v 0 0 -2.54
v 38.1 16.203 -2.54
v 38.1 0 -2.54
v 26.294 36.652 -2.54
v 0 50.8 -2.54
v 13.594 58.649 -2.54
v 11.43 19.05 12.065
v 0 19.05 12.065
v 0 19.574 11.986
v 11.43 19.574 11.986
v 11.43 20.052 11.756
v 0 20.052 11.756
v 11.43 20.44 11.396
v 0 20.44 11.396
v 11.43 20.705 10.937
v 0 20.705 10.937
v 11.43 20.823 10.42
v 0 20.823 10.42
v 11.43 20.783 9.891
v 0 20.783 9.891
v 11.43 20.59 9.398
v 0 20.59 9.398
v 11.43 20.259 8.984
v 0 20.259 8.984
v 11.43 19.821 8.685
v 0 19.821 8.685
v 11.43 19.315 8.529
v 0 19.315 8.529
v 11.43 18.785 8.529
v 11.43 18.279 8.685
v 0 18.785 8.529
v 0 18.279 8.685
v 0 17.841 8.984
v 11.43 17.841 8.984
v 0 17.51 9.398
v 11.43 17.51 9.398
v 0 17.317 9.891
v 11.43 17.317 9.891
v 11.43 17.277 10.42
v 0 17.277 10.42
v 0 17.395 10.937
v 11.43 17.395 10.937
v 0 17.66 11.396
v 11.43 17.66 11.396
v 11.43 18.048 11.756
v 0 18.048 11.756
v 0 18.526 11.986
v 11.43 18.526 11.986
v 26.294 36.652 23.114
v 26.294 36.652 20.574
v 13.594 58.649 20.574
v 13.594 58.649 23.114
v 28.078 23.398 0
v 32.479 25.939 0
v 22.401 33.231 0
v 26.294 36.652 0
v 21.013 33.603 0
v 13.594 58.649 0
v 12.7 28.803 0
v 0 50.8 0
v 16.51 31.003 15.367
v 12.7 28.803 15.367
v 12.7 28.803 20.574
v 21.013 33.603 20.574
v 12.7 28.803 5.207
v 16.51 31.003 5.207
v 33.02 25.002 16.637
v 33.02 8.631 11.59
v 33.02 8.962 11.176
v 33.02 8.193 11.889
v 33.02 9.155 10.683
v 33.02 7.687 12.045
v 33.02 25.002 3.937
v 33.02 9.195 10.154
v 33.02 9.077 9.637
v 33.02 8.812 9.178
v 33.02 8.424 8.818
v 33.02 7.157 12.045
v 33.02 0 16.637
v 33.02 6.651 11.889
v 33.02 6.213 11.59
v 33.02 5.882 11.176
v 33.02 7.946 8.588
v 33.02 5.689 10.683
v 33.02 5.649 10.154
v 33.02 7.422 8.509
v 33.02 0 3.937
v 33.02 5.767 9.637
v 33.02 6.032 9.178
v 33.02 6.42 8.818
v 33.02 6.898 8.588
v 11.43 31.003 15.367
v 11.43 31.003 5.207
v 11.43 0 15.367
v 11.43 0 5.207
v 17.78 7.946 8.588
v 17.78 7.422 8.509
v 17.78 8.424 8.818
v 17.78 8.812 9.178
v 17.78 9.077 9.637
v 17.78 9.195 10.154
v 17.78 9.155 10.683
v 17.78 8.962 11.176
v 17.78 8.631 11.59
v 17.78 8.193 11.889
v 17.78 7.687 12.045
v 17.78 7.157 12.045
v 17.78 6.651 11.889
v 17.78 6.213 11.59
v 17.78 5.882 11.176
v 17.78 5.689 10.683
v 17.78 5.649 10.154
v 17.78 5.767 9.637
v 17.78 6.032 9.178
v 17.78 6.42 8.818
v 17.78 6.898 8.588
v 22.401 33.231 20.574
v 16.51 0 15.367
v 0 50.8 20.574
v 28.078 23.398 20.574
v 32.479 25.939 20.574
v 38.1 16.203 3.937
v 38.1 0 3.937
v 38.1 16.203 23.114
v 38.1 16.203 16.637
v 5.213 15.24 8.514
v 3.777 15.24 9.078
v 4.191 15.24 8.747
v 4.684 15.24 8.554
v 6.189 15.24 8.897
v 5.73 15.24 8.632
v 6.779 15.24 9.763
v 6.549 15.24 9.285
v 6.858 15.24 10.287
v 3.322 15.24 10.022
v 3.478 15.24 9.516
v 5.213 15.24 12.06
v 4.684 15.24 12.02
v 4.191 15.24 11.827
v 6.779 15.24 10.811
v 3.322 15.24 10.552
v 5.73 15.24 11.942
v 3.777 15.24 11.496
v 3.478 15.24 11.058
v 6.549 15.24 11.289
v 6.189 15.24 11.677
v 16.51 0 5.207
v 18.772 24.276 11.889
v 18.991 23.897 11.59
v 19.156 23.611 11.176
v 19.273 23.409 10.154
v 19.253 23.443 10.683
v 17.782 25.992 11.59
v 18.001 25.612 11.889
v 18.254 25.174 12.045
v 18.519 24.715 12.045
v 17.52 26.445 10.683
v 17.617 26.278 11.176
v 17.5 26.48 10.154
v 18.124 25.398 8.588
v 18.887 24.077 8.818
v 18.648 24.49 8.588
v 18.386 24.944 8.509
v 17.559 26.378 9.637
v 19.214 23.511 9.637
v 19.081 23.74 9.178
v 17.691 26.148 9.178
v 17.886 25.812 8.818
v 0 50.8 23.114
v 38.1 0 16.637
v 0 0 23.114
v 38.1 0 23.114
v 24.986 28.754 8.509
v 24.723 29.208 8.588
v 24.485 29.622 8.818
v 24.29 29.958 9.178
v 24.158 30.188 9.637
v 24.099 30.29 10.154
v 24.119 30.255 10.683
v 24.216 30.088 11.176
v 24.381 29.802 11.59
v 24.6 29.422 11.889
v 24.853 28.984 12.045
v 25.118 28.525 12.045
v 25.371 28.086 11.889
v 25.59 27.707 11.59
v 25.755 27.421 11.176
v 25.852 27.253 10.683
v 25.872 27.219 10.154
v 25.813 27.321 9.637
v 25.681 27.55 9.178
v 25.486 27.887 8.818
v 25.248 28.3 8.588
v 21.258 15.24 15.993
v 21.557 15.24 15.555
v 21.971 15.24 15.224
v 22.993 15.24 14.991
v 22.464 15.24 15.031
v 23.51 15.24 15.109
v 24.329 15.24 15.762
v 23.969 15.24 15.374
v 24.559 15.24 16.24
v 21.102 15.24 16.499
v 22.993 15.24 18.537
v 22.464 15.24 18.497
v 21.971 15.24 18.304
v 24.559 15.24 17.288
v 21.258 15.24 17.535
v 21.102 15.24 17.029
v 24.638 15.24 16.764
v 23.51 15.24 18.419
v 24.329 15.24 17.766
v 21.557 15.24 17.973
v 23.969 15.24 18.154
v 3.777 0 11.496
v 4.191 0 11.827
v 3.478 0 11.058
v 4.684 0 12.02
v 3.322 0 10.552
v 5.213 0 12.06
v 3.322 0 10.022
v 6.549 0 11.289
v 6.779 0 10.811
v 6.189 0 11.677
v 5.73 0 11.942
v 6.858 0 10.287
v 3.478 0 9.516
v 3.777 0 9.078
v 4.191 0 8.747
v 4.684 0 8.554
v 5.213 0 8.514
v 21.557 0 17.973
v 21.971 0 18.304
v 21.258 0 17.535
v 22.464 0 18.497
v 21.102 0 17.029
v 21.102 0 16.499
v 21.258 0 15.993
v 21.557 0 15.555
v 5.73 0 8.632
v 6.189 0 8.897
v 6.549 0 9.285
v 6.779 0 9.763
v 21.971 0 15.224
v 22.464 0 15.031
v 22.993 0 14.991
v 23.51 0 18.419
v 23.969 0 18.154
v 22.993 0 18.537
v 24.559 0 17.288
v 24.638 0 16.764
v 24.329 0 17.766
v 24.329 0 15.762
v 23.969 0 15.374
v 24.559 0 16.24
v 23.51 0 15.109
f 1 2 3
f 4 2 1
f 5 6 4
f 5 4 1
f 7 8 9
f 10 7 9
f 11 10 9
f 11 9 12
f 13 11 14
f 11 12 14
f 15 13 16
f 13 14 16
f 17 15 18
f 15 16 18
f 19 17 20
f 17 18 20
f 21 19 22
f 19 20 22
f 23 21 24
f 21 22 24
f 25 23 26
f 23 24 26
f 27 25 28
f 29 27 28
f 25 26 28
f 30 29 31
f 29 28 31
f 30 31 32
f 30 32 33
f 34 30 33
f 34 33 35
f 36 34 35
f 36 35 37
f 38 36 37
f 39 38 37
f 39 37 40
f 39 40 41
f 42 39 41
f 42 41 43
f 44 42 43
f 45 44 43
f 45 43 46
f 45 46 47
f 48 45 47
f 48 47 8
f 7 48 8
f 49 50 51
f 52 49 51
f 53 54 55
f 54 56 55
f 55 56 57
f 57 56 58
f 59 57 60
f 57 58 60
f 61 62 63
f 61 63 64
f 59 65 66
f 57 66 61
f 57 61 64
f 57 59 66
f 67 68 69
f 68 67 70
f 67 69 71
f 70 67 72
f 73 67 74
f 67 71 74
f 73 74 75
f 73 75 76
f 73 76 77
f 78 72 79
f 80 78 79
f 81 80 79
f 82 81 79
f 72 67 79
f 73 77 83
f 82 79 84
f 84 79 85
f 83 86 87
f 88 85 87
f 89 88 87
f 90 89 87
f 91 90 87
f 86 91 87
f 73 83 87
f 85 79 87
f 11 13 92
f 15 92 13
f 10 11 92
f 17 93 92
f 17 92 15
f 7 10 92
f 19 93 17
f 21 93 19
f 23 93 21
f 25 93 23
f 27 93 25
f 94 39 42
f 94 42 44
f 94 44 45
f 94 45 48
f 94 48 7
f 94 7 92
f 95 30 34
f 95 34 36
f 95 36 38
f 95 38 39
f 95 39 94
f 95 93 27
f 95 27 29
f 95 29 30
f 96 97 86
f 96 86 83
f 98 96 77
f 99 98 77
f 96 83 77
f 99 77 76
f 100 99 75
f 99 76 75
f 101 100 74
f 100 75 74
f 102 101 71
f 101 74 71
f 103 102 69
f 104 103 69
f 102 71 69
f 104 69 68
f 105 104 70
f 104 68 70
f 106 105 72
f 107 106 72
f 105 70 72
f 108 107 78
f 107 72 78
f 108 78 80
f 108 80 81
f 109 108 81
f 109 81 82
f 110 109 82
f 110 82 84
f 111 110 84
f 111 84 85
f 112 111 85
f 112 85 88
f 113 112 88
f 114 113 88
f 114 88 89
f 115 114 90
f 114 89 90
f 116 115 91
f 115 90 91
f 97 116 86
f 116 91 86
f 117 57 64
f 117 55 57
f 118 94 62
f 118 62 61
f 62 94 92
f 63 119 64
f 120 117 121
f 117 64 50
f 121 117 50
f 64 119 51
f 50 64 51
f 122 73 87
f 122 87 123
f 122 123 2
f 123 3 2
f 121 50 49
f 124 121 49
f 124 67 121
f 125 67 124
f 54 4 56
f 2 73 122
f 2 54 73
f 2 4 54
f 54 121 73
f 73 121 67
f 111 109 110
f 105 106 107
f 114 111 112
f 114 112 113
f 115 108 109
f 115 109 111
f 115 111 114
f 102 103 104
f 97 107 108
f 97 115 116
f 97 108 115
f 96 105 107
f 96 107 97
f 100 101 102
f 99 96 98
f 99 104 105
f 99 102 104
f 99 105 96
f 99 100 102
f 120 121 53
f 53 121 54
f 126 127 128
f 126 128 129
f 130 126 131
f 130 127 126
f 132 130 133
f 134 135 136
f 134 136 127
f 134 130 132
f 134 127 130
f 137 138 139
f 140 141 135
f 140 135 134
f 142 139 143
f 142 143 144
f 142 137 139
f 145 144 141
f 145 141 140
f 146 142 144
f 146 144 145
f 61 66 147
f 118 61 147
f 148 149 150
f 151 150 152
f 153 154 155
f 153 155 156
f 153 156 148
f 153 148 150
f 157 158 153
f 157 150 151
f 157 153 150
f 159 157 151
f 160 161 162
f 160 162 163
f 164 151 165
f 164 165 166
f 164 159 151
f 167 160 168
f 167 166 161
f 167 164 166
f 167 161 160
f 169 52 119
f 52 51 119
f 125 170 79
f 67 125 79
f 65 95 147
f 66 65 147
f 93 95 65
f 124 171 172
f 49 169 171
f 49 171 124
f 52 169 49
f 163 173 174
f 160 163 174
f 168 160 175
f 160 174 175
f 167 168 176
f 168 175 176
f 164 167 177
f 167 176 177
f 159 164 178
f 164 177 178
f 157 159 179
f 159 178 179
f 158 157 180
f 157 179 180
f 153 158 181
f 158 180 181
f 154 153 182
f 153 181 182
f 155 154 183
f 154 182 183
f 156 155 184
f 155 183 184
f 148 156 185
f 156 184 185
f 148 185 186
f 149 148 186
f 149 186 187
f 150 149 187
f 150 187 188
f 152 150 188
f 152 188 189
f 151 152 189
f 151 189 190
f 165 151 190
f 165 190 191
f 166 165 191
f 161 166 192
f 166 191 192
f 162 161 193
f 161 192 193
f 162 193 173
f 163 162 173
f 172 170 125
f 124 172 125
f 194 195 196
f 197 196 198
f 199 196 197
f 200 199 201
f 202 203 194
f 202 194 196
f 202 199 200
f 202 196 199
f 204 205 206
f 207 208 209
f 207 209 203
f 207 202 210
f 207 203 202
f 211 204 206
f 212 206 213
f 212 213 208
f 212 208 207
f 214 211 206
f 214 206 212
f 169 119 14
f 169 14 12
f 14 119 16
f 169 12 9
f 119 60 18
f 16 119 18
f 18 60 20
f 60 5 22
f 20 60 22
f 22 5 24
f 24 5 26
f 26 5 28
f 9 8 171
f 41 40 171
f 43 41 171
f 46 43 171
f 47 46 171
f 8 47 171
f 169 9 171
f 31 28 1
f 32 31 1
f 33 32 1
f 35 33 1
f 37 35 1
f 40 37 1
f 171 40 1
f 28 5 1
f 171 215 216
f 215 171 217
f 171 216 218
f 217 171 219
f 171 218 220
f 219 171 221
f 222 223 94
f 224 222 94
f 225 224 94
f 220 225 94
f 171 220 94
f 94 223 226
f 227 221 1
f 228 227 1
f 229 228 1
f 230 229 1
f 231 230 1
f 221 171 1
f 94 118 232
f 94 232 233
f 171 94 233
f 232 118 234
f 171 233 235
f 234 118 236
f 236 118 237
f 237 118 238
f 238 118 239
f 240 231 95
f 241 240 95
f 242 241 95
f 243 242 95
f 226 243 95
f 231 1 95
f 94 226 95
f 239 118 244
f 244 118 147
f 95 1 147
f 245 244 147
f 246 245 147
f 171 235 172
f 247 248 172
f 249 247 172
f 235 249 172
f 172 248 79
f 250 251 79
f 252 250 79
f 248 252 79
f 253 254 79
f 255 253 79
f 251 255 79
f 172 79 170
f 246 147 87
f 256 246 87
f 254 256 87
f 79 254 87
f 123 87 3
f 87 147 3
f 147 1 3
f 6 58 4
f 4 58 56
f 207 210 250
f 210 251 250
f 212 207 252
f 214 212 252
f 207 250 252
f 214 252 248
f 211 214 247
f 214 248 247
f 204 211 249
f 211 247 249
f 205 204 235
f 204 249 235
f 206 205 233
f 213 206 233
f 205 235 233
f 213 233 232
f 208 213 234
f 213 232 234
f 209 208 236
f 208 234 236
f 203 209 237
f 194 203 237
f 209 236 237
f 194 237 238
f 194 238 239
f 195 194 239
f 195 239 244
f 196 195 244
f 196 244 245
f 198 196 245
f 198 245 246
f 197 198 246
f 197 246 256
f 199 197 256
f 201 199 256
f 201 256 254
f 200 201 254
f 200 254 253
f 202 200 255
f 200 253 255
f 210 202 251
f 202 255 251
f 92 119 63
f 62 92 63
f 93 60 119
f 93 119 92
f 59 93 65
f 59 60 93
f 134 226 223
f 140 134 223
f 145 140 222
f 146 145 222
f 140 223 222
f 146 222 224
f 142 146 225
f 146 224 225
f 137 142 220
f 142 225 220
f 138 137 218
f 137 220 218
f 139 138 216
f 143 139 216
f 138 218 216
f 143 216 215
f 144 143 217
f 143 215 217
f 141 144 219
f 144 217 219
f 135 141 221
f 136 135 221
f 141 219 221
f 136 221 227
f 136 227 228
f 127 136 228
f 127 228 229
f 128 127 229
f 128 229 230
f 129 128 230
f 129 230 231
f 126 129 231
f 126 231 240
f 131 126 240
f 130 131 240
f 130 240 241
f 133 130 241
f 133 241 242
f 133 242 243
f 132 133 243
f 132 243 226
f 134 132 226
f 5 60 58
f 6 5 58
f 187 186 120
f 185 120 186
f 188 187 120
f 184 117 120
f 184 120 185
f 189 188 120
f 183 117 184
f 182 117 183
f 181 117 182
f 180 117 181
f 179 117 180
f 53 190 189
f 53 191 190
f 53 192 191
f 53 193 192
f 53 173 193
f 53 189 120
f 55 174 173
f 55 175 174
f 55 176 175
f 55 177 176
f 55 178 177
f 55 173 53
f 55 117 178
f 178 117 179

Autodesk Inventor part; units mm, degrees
ref_plane "YZ Plane" through (0, 0, 0) normal (1, 0, 0) x (0, 1, 0)
ref_plane "XZ Plane" through (0, 0, 0) normal (0, 1, 0) x (-1, 0, 0)
sketch "Sketch1" plane through (0, 0, 0) normal (0, 0, 1) x (1, 0, 0)
  line L0 (0, 0) -> (38.1, 0)
  line L1 (38.1, 0) -> (38.1, 16.2033)
  line L2 (0, 50.8) -> (0, 0)
  line L3 (0, 50.8) -> (13.5942, 58.6486)
  line L4 (0, 50.8) -> (12.7, 28.803)
  line L5 (12.7, 28.803) -> (26.2942, 36.6516)
  line L6 (26.2942, 36.6516) -> (13.5942, 58.6486)
  line L7 (26.2942, 36.6516) -> (38.1, 16.2033)
  dimension "d0" = 15.6972
  dimension "d1" = 25.4
  dimension "d2" = 38.1
  dimension "d3" = 50.8
  dimension "d4" = 120
extrude "Extrusion1" add sketch "Sketch1" along normal blind 20.574 contours L2 L4 L5 L7 L1 L0
sketch "Sketch2" plane through (0, 0, 20.574) normal (0, 0, 1) x (1, 0, 0)
  line L0 (0, 50.8) -> (0, 0) projected
  line L1 (0, 0) -> (38.1, 0) projected
  line L2 (38.1, 0) -> (38.1, 16.2033) projected
  line L3 (38.1, 16.2033) -> (26.2942, 36.6516) projected
  line L4 (26.2942, 36.6516) -> (12.7, 28.803) projected
  line L5 (12.7, 28.803) -> (0, 50.8) projected
  line L6 (26.2942, 36.6516) -> (13.5942, 58.6486)
  line L7 (13.5942, 58.6486) -> (0, 50.8)
  line L8 (38.1, 16.2033) -> (26.2942, 36.6516) projected
extrude "Extrusion2" add sketch "Sketch2" along normal blind 2.54
ref_plane "Work Plane1" through (0, 0, 10.287) normal (0, 0, -1) x (-1, 0, 0)
mirror "Mirror1" about plane through (0, 0, 10.287) normal (0, 0, -1) of "Extrusion2"
sketch "Sketch3" plane through (0, 0, 23.114) normal (0, -1, 0) x (1, 0, 0)
  line L0 (38.1, -25.654) -> (38.1, 0) projected
  line L1 (38.1, -6.477) -> (33.02, -6.477)
  line L2 (33.02, -6.477) -> (33.02, -19.177)
  line L3 (33.02, -19.177) -> (38.1, -19.177)
  line L4 (38.1, -19.177) -> (38.1, -6.477)
  point P0 (0, -23.114)
  point P1 (38.1, -12.827)
  point P2 (38.1, -19.177)
  dimension "d9" = 12.7
  dimension "d10" = 5.08
  dimension "d11" = 6.35
extrude "Extrusion3" cut sketch "Sketch3" against normal blind 33.9725
sketch "Sketch4" plane through (33.02, 0, 16.637) normal (1, 0, 0) x (0, 0, -1)
  circle A0 centre (6.35, 7.422) radius 1.778 projected
  point P0 (16.637, 0)
extrude "Extrusion4" cut sketch "Sketch4" against normal blind 15.24
ref_plane "Work Plane2" through (0, 0, 10.287) normal (0, 0, 1) x (1, 0, 0)
sketch "Sketch5" plane through (0, 0, 10.287) normal (0, 0, 1) x (1, 0, 0)
  line L0 (26.2942, 36.6516) -> (12.7, 28.803) projected
  line L1 (16.51, 31.0027) -> (11.43, 31.0027)
  line L2 (12.7, 28.803) -> (0, 50.8) projected
  line L3 (16.51, 31.0027) -> (16.51, 0)
  line L4 (0, 0) -> (38.1, 0) projected
  line L5 (11.43, 31.0027) -> (11.43, 0)
  line L6 (16.51, 0) -> (11.43, 0)
  dimension "d16" = 5.08
extrude "Extrusion5" cut sketch "Sketch5" along normal mid plane 10.16 contours L3 L4 L5 L2 L0
sketch "Sketch6" plane through (13.5942, 58.6486, 23.114) normal (0.8660254, 0.5, 0) x (0, 0, -1)
  line L0 (23.114, -25.4) -> (2.54, -25.4)
  line L1 (2.54, -25.4) -> (2.54, -37.7698)
  line L2 (2.54, -37.7698) -> (23.114, -37.7698)
  line L3 (23.114, -37.7698) -> (23.114, -25.4)
  point P0 (23.114, -43.9941)
  dimension "d19" = 12.3698
extrude "Extrusion6" cut sketch "Sketch6" against normal blind 5.08
chamfer "Chamfer1" distance 1.016 angle 45 1 edges at (21.893, 34.1106, 10.287)
sketch "Sketch7" plane through (9.1948, 56.1086, 23.114) normal (0.8660254, 0.5, 0) x (0, 0, -1)
  circle A0 centre (12.827, -31.5849) radius 1.778
  line L0 (2.54, -25.4) -> (2.54, -26.416) projected
  line L1 (2.54, -37.7698) -> (2.54, -26.416) projected
  line L2 (23.114, -37.7698) -> (2.54, -37.7698) projected
  line L3 (2.54, -25.4) -> (2.54, -37.7698)
  line L4 (2.54, -25.4) -> (2.54, -37.7698)
  point P0 (23.114, -43.9941)
  point P1 (2.54, -31.5849)
  point P2 (12.827, -37.7698)
  dimension "d25" = 3.556
extrude "Extrusion7" cut sketch "Sketch7" against normal blind 7.62
sketch "Sketch8" plane through (0, 0, 23.114) normal (-1, 0, 0) x (0, 0, 1)
  circle A0 centre (-12.827, 19.05) radius 1.778 projected
  point P0 (-23.114, 0)
extrude "Extrusion8" cut sketch "Sketch8" against normal blind 15.24
sketch "Sketch9" plane through (0, 0, 23.114) normal (0, -1, 0) x (1, 0, 0)
  circle A0 centre (5.08, -12.827) radius 1.778 projected
  circle A1 centre (22.86, -6.35) radius 1.778 projected
  circle A2 centre (22.86, -6.35) radius 1.778
  circle A3 centre (5.08, -12.827) radius 1.778
  point P0 (0, -23.114)
extrude "Extrusion9" cut sketch "Sketch9" against normal blind 15.24
equation "\"d11\" = 0.5 * d9"
properties part number "PALM 1"
